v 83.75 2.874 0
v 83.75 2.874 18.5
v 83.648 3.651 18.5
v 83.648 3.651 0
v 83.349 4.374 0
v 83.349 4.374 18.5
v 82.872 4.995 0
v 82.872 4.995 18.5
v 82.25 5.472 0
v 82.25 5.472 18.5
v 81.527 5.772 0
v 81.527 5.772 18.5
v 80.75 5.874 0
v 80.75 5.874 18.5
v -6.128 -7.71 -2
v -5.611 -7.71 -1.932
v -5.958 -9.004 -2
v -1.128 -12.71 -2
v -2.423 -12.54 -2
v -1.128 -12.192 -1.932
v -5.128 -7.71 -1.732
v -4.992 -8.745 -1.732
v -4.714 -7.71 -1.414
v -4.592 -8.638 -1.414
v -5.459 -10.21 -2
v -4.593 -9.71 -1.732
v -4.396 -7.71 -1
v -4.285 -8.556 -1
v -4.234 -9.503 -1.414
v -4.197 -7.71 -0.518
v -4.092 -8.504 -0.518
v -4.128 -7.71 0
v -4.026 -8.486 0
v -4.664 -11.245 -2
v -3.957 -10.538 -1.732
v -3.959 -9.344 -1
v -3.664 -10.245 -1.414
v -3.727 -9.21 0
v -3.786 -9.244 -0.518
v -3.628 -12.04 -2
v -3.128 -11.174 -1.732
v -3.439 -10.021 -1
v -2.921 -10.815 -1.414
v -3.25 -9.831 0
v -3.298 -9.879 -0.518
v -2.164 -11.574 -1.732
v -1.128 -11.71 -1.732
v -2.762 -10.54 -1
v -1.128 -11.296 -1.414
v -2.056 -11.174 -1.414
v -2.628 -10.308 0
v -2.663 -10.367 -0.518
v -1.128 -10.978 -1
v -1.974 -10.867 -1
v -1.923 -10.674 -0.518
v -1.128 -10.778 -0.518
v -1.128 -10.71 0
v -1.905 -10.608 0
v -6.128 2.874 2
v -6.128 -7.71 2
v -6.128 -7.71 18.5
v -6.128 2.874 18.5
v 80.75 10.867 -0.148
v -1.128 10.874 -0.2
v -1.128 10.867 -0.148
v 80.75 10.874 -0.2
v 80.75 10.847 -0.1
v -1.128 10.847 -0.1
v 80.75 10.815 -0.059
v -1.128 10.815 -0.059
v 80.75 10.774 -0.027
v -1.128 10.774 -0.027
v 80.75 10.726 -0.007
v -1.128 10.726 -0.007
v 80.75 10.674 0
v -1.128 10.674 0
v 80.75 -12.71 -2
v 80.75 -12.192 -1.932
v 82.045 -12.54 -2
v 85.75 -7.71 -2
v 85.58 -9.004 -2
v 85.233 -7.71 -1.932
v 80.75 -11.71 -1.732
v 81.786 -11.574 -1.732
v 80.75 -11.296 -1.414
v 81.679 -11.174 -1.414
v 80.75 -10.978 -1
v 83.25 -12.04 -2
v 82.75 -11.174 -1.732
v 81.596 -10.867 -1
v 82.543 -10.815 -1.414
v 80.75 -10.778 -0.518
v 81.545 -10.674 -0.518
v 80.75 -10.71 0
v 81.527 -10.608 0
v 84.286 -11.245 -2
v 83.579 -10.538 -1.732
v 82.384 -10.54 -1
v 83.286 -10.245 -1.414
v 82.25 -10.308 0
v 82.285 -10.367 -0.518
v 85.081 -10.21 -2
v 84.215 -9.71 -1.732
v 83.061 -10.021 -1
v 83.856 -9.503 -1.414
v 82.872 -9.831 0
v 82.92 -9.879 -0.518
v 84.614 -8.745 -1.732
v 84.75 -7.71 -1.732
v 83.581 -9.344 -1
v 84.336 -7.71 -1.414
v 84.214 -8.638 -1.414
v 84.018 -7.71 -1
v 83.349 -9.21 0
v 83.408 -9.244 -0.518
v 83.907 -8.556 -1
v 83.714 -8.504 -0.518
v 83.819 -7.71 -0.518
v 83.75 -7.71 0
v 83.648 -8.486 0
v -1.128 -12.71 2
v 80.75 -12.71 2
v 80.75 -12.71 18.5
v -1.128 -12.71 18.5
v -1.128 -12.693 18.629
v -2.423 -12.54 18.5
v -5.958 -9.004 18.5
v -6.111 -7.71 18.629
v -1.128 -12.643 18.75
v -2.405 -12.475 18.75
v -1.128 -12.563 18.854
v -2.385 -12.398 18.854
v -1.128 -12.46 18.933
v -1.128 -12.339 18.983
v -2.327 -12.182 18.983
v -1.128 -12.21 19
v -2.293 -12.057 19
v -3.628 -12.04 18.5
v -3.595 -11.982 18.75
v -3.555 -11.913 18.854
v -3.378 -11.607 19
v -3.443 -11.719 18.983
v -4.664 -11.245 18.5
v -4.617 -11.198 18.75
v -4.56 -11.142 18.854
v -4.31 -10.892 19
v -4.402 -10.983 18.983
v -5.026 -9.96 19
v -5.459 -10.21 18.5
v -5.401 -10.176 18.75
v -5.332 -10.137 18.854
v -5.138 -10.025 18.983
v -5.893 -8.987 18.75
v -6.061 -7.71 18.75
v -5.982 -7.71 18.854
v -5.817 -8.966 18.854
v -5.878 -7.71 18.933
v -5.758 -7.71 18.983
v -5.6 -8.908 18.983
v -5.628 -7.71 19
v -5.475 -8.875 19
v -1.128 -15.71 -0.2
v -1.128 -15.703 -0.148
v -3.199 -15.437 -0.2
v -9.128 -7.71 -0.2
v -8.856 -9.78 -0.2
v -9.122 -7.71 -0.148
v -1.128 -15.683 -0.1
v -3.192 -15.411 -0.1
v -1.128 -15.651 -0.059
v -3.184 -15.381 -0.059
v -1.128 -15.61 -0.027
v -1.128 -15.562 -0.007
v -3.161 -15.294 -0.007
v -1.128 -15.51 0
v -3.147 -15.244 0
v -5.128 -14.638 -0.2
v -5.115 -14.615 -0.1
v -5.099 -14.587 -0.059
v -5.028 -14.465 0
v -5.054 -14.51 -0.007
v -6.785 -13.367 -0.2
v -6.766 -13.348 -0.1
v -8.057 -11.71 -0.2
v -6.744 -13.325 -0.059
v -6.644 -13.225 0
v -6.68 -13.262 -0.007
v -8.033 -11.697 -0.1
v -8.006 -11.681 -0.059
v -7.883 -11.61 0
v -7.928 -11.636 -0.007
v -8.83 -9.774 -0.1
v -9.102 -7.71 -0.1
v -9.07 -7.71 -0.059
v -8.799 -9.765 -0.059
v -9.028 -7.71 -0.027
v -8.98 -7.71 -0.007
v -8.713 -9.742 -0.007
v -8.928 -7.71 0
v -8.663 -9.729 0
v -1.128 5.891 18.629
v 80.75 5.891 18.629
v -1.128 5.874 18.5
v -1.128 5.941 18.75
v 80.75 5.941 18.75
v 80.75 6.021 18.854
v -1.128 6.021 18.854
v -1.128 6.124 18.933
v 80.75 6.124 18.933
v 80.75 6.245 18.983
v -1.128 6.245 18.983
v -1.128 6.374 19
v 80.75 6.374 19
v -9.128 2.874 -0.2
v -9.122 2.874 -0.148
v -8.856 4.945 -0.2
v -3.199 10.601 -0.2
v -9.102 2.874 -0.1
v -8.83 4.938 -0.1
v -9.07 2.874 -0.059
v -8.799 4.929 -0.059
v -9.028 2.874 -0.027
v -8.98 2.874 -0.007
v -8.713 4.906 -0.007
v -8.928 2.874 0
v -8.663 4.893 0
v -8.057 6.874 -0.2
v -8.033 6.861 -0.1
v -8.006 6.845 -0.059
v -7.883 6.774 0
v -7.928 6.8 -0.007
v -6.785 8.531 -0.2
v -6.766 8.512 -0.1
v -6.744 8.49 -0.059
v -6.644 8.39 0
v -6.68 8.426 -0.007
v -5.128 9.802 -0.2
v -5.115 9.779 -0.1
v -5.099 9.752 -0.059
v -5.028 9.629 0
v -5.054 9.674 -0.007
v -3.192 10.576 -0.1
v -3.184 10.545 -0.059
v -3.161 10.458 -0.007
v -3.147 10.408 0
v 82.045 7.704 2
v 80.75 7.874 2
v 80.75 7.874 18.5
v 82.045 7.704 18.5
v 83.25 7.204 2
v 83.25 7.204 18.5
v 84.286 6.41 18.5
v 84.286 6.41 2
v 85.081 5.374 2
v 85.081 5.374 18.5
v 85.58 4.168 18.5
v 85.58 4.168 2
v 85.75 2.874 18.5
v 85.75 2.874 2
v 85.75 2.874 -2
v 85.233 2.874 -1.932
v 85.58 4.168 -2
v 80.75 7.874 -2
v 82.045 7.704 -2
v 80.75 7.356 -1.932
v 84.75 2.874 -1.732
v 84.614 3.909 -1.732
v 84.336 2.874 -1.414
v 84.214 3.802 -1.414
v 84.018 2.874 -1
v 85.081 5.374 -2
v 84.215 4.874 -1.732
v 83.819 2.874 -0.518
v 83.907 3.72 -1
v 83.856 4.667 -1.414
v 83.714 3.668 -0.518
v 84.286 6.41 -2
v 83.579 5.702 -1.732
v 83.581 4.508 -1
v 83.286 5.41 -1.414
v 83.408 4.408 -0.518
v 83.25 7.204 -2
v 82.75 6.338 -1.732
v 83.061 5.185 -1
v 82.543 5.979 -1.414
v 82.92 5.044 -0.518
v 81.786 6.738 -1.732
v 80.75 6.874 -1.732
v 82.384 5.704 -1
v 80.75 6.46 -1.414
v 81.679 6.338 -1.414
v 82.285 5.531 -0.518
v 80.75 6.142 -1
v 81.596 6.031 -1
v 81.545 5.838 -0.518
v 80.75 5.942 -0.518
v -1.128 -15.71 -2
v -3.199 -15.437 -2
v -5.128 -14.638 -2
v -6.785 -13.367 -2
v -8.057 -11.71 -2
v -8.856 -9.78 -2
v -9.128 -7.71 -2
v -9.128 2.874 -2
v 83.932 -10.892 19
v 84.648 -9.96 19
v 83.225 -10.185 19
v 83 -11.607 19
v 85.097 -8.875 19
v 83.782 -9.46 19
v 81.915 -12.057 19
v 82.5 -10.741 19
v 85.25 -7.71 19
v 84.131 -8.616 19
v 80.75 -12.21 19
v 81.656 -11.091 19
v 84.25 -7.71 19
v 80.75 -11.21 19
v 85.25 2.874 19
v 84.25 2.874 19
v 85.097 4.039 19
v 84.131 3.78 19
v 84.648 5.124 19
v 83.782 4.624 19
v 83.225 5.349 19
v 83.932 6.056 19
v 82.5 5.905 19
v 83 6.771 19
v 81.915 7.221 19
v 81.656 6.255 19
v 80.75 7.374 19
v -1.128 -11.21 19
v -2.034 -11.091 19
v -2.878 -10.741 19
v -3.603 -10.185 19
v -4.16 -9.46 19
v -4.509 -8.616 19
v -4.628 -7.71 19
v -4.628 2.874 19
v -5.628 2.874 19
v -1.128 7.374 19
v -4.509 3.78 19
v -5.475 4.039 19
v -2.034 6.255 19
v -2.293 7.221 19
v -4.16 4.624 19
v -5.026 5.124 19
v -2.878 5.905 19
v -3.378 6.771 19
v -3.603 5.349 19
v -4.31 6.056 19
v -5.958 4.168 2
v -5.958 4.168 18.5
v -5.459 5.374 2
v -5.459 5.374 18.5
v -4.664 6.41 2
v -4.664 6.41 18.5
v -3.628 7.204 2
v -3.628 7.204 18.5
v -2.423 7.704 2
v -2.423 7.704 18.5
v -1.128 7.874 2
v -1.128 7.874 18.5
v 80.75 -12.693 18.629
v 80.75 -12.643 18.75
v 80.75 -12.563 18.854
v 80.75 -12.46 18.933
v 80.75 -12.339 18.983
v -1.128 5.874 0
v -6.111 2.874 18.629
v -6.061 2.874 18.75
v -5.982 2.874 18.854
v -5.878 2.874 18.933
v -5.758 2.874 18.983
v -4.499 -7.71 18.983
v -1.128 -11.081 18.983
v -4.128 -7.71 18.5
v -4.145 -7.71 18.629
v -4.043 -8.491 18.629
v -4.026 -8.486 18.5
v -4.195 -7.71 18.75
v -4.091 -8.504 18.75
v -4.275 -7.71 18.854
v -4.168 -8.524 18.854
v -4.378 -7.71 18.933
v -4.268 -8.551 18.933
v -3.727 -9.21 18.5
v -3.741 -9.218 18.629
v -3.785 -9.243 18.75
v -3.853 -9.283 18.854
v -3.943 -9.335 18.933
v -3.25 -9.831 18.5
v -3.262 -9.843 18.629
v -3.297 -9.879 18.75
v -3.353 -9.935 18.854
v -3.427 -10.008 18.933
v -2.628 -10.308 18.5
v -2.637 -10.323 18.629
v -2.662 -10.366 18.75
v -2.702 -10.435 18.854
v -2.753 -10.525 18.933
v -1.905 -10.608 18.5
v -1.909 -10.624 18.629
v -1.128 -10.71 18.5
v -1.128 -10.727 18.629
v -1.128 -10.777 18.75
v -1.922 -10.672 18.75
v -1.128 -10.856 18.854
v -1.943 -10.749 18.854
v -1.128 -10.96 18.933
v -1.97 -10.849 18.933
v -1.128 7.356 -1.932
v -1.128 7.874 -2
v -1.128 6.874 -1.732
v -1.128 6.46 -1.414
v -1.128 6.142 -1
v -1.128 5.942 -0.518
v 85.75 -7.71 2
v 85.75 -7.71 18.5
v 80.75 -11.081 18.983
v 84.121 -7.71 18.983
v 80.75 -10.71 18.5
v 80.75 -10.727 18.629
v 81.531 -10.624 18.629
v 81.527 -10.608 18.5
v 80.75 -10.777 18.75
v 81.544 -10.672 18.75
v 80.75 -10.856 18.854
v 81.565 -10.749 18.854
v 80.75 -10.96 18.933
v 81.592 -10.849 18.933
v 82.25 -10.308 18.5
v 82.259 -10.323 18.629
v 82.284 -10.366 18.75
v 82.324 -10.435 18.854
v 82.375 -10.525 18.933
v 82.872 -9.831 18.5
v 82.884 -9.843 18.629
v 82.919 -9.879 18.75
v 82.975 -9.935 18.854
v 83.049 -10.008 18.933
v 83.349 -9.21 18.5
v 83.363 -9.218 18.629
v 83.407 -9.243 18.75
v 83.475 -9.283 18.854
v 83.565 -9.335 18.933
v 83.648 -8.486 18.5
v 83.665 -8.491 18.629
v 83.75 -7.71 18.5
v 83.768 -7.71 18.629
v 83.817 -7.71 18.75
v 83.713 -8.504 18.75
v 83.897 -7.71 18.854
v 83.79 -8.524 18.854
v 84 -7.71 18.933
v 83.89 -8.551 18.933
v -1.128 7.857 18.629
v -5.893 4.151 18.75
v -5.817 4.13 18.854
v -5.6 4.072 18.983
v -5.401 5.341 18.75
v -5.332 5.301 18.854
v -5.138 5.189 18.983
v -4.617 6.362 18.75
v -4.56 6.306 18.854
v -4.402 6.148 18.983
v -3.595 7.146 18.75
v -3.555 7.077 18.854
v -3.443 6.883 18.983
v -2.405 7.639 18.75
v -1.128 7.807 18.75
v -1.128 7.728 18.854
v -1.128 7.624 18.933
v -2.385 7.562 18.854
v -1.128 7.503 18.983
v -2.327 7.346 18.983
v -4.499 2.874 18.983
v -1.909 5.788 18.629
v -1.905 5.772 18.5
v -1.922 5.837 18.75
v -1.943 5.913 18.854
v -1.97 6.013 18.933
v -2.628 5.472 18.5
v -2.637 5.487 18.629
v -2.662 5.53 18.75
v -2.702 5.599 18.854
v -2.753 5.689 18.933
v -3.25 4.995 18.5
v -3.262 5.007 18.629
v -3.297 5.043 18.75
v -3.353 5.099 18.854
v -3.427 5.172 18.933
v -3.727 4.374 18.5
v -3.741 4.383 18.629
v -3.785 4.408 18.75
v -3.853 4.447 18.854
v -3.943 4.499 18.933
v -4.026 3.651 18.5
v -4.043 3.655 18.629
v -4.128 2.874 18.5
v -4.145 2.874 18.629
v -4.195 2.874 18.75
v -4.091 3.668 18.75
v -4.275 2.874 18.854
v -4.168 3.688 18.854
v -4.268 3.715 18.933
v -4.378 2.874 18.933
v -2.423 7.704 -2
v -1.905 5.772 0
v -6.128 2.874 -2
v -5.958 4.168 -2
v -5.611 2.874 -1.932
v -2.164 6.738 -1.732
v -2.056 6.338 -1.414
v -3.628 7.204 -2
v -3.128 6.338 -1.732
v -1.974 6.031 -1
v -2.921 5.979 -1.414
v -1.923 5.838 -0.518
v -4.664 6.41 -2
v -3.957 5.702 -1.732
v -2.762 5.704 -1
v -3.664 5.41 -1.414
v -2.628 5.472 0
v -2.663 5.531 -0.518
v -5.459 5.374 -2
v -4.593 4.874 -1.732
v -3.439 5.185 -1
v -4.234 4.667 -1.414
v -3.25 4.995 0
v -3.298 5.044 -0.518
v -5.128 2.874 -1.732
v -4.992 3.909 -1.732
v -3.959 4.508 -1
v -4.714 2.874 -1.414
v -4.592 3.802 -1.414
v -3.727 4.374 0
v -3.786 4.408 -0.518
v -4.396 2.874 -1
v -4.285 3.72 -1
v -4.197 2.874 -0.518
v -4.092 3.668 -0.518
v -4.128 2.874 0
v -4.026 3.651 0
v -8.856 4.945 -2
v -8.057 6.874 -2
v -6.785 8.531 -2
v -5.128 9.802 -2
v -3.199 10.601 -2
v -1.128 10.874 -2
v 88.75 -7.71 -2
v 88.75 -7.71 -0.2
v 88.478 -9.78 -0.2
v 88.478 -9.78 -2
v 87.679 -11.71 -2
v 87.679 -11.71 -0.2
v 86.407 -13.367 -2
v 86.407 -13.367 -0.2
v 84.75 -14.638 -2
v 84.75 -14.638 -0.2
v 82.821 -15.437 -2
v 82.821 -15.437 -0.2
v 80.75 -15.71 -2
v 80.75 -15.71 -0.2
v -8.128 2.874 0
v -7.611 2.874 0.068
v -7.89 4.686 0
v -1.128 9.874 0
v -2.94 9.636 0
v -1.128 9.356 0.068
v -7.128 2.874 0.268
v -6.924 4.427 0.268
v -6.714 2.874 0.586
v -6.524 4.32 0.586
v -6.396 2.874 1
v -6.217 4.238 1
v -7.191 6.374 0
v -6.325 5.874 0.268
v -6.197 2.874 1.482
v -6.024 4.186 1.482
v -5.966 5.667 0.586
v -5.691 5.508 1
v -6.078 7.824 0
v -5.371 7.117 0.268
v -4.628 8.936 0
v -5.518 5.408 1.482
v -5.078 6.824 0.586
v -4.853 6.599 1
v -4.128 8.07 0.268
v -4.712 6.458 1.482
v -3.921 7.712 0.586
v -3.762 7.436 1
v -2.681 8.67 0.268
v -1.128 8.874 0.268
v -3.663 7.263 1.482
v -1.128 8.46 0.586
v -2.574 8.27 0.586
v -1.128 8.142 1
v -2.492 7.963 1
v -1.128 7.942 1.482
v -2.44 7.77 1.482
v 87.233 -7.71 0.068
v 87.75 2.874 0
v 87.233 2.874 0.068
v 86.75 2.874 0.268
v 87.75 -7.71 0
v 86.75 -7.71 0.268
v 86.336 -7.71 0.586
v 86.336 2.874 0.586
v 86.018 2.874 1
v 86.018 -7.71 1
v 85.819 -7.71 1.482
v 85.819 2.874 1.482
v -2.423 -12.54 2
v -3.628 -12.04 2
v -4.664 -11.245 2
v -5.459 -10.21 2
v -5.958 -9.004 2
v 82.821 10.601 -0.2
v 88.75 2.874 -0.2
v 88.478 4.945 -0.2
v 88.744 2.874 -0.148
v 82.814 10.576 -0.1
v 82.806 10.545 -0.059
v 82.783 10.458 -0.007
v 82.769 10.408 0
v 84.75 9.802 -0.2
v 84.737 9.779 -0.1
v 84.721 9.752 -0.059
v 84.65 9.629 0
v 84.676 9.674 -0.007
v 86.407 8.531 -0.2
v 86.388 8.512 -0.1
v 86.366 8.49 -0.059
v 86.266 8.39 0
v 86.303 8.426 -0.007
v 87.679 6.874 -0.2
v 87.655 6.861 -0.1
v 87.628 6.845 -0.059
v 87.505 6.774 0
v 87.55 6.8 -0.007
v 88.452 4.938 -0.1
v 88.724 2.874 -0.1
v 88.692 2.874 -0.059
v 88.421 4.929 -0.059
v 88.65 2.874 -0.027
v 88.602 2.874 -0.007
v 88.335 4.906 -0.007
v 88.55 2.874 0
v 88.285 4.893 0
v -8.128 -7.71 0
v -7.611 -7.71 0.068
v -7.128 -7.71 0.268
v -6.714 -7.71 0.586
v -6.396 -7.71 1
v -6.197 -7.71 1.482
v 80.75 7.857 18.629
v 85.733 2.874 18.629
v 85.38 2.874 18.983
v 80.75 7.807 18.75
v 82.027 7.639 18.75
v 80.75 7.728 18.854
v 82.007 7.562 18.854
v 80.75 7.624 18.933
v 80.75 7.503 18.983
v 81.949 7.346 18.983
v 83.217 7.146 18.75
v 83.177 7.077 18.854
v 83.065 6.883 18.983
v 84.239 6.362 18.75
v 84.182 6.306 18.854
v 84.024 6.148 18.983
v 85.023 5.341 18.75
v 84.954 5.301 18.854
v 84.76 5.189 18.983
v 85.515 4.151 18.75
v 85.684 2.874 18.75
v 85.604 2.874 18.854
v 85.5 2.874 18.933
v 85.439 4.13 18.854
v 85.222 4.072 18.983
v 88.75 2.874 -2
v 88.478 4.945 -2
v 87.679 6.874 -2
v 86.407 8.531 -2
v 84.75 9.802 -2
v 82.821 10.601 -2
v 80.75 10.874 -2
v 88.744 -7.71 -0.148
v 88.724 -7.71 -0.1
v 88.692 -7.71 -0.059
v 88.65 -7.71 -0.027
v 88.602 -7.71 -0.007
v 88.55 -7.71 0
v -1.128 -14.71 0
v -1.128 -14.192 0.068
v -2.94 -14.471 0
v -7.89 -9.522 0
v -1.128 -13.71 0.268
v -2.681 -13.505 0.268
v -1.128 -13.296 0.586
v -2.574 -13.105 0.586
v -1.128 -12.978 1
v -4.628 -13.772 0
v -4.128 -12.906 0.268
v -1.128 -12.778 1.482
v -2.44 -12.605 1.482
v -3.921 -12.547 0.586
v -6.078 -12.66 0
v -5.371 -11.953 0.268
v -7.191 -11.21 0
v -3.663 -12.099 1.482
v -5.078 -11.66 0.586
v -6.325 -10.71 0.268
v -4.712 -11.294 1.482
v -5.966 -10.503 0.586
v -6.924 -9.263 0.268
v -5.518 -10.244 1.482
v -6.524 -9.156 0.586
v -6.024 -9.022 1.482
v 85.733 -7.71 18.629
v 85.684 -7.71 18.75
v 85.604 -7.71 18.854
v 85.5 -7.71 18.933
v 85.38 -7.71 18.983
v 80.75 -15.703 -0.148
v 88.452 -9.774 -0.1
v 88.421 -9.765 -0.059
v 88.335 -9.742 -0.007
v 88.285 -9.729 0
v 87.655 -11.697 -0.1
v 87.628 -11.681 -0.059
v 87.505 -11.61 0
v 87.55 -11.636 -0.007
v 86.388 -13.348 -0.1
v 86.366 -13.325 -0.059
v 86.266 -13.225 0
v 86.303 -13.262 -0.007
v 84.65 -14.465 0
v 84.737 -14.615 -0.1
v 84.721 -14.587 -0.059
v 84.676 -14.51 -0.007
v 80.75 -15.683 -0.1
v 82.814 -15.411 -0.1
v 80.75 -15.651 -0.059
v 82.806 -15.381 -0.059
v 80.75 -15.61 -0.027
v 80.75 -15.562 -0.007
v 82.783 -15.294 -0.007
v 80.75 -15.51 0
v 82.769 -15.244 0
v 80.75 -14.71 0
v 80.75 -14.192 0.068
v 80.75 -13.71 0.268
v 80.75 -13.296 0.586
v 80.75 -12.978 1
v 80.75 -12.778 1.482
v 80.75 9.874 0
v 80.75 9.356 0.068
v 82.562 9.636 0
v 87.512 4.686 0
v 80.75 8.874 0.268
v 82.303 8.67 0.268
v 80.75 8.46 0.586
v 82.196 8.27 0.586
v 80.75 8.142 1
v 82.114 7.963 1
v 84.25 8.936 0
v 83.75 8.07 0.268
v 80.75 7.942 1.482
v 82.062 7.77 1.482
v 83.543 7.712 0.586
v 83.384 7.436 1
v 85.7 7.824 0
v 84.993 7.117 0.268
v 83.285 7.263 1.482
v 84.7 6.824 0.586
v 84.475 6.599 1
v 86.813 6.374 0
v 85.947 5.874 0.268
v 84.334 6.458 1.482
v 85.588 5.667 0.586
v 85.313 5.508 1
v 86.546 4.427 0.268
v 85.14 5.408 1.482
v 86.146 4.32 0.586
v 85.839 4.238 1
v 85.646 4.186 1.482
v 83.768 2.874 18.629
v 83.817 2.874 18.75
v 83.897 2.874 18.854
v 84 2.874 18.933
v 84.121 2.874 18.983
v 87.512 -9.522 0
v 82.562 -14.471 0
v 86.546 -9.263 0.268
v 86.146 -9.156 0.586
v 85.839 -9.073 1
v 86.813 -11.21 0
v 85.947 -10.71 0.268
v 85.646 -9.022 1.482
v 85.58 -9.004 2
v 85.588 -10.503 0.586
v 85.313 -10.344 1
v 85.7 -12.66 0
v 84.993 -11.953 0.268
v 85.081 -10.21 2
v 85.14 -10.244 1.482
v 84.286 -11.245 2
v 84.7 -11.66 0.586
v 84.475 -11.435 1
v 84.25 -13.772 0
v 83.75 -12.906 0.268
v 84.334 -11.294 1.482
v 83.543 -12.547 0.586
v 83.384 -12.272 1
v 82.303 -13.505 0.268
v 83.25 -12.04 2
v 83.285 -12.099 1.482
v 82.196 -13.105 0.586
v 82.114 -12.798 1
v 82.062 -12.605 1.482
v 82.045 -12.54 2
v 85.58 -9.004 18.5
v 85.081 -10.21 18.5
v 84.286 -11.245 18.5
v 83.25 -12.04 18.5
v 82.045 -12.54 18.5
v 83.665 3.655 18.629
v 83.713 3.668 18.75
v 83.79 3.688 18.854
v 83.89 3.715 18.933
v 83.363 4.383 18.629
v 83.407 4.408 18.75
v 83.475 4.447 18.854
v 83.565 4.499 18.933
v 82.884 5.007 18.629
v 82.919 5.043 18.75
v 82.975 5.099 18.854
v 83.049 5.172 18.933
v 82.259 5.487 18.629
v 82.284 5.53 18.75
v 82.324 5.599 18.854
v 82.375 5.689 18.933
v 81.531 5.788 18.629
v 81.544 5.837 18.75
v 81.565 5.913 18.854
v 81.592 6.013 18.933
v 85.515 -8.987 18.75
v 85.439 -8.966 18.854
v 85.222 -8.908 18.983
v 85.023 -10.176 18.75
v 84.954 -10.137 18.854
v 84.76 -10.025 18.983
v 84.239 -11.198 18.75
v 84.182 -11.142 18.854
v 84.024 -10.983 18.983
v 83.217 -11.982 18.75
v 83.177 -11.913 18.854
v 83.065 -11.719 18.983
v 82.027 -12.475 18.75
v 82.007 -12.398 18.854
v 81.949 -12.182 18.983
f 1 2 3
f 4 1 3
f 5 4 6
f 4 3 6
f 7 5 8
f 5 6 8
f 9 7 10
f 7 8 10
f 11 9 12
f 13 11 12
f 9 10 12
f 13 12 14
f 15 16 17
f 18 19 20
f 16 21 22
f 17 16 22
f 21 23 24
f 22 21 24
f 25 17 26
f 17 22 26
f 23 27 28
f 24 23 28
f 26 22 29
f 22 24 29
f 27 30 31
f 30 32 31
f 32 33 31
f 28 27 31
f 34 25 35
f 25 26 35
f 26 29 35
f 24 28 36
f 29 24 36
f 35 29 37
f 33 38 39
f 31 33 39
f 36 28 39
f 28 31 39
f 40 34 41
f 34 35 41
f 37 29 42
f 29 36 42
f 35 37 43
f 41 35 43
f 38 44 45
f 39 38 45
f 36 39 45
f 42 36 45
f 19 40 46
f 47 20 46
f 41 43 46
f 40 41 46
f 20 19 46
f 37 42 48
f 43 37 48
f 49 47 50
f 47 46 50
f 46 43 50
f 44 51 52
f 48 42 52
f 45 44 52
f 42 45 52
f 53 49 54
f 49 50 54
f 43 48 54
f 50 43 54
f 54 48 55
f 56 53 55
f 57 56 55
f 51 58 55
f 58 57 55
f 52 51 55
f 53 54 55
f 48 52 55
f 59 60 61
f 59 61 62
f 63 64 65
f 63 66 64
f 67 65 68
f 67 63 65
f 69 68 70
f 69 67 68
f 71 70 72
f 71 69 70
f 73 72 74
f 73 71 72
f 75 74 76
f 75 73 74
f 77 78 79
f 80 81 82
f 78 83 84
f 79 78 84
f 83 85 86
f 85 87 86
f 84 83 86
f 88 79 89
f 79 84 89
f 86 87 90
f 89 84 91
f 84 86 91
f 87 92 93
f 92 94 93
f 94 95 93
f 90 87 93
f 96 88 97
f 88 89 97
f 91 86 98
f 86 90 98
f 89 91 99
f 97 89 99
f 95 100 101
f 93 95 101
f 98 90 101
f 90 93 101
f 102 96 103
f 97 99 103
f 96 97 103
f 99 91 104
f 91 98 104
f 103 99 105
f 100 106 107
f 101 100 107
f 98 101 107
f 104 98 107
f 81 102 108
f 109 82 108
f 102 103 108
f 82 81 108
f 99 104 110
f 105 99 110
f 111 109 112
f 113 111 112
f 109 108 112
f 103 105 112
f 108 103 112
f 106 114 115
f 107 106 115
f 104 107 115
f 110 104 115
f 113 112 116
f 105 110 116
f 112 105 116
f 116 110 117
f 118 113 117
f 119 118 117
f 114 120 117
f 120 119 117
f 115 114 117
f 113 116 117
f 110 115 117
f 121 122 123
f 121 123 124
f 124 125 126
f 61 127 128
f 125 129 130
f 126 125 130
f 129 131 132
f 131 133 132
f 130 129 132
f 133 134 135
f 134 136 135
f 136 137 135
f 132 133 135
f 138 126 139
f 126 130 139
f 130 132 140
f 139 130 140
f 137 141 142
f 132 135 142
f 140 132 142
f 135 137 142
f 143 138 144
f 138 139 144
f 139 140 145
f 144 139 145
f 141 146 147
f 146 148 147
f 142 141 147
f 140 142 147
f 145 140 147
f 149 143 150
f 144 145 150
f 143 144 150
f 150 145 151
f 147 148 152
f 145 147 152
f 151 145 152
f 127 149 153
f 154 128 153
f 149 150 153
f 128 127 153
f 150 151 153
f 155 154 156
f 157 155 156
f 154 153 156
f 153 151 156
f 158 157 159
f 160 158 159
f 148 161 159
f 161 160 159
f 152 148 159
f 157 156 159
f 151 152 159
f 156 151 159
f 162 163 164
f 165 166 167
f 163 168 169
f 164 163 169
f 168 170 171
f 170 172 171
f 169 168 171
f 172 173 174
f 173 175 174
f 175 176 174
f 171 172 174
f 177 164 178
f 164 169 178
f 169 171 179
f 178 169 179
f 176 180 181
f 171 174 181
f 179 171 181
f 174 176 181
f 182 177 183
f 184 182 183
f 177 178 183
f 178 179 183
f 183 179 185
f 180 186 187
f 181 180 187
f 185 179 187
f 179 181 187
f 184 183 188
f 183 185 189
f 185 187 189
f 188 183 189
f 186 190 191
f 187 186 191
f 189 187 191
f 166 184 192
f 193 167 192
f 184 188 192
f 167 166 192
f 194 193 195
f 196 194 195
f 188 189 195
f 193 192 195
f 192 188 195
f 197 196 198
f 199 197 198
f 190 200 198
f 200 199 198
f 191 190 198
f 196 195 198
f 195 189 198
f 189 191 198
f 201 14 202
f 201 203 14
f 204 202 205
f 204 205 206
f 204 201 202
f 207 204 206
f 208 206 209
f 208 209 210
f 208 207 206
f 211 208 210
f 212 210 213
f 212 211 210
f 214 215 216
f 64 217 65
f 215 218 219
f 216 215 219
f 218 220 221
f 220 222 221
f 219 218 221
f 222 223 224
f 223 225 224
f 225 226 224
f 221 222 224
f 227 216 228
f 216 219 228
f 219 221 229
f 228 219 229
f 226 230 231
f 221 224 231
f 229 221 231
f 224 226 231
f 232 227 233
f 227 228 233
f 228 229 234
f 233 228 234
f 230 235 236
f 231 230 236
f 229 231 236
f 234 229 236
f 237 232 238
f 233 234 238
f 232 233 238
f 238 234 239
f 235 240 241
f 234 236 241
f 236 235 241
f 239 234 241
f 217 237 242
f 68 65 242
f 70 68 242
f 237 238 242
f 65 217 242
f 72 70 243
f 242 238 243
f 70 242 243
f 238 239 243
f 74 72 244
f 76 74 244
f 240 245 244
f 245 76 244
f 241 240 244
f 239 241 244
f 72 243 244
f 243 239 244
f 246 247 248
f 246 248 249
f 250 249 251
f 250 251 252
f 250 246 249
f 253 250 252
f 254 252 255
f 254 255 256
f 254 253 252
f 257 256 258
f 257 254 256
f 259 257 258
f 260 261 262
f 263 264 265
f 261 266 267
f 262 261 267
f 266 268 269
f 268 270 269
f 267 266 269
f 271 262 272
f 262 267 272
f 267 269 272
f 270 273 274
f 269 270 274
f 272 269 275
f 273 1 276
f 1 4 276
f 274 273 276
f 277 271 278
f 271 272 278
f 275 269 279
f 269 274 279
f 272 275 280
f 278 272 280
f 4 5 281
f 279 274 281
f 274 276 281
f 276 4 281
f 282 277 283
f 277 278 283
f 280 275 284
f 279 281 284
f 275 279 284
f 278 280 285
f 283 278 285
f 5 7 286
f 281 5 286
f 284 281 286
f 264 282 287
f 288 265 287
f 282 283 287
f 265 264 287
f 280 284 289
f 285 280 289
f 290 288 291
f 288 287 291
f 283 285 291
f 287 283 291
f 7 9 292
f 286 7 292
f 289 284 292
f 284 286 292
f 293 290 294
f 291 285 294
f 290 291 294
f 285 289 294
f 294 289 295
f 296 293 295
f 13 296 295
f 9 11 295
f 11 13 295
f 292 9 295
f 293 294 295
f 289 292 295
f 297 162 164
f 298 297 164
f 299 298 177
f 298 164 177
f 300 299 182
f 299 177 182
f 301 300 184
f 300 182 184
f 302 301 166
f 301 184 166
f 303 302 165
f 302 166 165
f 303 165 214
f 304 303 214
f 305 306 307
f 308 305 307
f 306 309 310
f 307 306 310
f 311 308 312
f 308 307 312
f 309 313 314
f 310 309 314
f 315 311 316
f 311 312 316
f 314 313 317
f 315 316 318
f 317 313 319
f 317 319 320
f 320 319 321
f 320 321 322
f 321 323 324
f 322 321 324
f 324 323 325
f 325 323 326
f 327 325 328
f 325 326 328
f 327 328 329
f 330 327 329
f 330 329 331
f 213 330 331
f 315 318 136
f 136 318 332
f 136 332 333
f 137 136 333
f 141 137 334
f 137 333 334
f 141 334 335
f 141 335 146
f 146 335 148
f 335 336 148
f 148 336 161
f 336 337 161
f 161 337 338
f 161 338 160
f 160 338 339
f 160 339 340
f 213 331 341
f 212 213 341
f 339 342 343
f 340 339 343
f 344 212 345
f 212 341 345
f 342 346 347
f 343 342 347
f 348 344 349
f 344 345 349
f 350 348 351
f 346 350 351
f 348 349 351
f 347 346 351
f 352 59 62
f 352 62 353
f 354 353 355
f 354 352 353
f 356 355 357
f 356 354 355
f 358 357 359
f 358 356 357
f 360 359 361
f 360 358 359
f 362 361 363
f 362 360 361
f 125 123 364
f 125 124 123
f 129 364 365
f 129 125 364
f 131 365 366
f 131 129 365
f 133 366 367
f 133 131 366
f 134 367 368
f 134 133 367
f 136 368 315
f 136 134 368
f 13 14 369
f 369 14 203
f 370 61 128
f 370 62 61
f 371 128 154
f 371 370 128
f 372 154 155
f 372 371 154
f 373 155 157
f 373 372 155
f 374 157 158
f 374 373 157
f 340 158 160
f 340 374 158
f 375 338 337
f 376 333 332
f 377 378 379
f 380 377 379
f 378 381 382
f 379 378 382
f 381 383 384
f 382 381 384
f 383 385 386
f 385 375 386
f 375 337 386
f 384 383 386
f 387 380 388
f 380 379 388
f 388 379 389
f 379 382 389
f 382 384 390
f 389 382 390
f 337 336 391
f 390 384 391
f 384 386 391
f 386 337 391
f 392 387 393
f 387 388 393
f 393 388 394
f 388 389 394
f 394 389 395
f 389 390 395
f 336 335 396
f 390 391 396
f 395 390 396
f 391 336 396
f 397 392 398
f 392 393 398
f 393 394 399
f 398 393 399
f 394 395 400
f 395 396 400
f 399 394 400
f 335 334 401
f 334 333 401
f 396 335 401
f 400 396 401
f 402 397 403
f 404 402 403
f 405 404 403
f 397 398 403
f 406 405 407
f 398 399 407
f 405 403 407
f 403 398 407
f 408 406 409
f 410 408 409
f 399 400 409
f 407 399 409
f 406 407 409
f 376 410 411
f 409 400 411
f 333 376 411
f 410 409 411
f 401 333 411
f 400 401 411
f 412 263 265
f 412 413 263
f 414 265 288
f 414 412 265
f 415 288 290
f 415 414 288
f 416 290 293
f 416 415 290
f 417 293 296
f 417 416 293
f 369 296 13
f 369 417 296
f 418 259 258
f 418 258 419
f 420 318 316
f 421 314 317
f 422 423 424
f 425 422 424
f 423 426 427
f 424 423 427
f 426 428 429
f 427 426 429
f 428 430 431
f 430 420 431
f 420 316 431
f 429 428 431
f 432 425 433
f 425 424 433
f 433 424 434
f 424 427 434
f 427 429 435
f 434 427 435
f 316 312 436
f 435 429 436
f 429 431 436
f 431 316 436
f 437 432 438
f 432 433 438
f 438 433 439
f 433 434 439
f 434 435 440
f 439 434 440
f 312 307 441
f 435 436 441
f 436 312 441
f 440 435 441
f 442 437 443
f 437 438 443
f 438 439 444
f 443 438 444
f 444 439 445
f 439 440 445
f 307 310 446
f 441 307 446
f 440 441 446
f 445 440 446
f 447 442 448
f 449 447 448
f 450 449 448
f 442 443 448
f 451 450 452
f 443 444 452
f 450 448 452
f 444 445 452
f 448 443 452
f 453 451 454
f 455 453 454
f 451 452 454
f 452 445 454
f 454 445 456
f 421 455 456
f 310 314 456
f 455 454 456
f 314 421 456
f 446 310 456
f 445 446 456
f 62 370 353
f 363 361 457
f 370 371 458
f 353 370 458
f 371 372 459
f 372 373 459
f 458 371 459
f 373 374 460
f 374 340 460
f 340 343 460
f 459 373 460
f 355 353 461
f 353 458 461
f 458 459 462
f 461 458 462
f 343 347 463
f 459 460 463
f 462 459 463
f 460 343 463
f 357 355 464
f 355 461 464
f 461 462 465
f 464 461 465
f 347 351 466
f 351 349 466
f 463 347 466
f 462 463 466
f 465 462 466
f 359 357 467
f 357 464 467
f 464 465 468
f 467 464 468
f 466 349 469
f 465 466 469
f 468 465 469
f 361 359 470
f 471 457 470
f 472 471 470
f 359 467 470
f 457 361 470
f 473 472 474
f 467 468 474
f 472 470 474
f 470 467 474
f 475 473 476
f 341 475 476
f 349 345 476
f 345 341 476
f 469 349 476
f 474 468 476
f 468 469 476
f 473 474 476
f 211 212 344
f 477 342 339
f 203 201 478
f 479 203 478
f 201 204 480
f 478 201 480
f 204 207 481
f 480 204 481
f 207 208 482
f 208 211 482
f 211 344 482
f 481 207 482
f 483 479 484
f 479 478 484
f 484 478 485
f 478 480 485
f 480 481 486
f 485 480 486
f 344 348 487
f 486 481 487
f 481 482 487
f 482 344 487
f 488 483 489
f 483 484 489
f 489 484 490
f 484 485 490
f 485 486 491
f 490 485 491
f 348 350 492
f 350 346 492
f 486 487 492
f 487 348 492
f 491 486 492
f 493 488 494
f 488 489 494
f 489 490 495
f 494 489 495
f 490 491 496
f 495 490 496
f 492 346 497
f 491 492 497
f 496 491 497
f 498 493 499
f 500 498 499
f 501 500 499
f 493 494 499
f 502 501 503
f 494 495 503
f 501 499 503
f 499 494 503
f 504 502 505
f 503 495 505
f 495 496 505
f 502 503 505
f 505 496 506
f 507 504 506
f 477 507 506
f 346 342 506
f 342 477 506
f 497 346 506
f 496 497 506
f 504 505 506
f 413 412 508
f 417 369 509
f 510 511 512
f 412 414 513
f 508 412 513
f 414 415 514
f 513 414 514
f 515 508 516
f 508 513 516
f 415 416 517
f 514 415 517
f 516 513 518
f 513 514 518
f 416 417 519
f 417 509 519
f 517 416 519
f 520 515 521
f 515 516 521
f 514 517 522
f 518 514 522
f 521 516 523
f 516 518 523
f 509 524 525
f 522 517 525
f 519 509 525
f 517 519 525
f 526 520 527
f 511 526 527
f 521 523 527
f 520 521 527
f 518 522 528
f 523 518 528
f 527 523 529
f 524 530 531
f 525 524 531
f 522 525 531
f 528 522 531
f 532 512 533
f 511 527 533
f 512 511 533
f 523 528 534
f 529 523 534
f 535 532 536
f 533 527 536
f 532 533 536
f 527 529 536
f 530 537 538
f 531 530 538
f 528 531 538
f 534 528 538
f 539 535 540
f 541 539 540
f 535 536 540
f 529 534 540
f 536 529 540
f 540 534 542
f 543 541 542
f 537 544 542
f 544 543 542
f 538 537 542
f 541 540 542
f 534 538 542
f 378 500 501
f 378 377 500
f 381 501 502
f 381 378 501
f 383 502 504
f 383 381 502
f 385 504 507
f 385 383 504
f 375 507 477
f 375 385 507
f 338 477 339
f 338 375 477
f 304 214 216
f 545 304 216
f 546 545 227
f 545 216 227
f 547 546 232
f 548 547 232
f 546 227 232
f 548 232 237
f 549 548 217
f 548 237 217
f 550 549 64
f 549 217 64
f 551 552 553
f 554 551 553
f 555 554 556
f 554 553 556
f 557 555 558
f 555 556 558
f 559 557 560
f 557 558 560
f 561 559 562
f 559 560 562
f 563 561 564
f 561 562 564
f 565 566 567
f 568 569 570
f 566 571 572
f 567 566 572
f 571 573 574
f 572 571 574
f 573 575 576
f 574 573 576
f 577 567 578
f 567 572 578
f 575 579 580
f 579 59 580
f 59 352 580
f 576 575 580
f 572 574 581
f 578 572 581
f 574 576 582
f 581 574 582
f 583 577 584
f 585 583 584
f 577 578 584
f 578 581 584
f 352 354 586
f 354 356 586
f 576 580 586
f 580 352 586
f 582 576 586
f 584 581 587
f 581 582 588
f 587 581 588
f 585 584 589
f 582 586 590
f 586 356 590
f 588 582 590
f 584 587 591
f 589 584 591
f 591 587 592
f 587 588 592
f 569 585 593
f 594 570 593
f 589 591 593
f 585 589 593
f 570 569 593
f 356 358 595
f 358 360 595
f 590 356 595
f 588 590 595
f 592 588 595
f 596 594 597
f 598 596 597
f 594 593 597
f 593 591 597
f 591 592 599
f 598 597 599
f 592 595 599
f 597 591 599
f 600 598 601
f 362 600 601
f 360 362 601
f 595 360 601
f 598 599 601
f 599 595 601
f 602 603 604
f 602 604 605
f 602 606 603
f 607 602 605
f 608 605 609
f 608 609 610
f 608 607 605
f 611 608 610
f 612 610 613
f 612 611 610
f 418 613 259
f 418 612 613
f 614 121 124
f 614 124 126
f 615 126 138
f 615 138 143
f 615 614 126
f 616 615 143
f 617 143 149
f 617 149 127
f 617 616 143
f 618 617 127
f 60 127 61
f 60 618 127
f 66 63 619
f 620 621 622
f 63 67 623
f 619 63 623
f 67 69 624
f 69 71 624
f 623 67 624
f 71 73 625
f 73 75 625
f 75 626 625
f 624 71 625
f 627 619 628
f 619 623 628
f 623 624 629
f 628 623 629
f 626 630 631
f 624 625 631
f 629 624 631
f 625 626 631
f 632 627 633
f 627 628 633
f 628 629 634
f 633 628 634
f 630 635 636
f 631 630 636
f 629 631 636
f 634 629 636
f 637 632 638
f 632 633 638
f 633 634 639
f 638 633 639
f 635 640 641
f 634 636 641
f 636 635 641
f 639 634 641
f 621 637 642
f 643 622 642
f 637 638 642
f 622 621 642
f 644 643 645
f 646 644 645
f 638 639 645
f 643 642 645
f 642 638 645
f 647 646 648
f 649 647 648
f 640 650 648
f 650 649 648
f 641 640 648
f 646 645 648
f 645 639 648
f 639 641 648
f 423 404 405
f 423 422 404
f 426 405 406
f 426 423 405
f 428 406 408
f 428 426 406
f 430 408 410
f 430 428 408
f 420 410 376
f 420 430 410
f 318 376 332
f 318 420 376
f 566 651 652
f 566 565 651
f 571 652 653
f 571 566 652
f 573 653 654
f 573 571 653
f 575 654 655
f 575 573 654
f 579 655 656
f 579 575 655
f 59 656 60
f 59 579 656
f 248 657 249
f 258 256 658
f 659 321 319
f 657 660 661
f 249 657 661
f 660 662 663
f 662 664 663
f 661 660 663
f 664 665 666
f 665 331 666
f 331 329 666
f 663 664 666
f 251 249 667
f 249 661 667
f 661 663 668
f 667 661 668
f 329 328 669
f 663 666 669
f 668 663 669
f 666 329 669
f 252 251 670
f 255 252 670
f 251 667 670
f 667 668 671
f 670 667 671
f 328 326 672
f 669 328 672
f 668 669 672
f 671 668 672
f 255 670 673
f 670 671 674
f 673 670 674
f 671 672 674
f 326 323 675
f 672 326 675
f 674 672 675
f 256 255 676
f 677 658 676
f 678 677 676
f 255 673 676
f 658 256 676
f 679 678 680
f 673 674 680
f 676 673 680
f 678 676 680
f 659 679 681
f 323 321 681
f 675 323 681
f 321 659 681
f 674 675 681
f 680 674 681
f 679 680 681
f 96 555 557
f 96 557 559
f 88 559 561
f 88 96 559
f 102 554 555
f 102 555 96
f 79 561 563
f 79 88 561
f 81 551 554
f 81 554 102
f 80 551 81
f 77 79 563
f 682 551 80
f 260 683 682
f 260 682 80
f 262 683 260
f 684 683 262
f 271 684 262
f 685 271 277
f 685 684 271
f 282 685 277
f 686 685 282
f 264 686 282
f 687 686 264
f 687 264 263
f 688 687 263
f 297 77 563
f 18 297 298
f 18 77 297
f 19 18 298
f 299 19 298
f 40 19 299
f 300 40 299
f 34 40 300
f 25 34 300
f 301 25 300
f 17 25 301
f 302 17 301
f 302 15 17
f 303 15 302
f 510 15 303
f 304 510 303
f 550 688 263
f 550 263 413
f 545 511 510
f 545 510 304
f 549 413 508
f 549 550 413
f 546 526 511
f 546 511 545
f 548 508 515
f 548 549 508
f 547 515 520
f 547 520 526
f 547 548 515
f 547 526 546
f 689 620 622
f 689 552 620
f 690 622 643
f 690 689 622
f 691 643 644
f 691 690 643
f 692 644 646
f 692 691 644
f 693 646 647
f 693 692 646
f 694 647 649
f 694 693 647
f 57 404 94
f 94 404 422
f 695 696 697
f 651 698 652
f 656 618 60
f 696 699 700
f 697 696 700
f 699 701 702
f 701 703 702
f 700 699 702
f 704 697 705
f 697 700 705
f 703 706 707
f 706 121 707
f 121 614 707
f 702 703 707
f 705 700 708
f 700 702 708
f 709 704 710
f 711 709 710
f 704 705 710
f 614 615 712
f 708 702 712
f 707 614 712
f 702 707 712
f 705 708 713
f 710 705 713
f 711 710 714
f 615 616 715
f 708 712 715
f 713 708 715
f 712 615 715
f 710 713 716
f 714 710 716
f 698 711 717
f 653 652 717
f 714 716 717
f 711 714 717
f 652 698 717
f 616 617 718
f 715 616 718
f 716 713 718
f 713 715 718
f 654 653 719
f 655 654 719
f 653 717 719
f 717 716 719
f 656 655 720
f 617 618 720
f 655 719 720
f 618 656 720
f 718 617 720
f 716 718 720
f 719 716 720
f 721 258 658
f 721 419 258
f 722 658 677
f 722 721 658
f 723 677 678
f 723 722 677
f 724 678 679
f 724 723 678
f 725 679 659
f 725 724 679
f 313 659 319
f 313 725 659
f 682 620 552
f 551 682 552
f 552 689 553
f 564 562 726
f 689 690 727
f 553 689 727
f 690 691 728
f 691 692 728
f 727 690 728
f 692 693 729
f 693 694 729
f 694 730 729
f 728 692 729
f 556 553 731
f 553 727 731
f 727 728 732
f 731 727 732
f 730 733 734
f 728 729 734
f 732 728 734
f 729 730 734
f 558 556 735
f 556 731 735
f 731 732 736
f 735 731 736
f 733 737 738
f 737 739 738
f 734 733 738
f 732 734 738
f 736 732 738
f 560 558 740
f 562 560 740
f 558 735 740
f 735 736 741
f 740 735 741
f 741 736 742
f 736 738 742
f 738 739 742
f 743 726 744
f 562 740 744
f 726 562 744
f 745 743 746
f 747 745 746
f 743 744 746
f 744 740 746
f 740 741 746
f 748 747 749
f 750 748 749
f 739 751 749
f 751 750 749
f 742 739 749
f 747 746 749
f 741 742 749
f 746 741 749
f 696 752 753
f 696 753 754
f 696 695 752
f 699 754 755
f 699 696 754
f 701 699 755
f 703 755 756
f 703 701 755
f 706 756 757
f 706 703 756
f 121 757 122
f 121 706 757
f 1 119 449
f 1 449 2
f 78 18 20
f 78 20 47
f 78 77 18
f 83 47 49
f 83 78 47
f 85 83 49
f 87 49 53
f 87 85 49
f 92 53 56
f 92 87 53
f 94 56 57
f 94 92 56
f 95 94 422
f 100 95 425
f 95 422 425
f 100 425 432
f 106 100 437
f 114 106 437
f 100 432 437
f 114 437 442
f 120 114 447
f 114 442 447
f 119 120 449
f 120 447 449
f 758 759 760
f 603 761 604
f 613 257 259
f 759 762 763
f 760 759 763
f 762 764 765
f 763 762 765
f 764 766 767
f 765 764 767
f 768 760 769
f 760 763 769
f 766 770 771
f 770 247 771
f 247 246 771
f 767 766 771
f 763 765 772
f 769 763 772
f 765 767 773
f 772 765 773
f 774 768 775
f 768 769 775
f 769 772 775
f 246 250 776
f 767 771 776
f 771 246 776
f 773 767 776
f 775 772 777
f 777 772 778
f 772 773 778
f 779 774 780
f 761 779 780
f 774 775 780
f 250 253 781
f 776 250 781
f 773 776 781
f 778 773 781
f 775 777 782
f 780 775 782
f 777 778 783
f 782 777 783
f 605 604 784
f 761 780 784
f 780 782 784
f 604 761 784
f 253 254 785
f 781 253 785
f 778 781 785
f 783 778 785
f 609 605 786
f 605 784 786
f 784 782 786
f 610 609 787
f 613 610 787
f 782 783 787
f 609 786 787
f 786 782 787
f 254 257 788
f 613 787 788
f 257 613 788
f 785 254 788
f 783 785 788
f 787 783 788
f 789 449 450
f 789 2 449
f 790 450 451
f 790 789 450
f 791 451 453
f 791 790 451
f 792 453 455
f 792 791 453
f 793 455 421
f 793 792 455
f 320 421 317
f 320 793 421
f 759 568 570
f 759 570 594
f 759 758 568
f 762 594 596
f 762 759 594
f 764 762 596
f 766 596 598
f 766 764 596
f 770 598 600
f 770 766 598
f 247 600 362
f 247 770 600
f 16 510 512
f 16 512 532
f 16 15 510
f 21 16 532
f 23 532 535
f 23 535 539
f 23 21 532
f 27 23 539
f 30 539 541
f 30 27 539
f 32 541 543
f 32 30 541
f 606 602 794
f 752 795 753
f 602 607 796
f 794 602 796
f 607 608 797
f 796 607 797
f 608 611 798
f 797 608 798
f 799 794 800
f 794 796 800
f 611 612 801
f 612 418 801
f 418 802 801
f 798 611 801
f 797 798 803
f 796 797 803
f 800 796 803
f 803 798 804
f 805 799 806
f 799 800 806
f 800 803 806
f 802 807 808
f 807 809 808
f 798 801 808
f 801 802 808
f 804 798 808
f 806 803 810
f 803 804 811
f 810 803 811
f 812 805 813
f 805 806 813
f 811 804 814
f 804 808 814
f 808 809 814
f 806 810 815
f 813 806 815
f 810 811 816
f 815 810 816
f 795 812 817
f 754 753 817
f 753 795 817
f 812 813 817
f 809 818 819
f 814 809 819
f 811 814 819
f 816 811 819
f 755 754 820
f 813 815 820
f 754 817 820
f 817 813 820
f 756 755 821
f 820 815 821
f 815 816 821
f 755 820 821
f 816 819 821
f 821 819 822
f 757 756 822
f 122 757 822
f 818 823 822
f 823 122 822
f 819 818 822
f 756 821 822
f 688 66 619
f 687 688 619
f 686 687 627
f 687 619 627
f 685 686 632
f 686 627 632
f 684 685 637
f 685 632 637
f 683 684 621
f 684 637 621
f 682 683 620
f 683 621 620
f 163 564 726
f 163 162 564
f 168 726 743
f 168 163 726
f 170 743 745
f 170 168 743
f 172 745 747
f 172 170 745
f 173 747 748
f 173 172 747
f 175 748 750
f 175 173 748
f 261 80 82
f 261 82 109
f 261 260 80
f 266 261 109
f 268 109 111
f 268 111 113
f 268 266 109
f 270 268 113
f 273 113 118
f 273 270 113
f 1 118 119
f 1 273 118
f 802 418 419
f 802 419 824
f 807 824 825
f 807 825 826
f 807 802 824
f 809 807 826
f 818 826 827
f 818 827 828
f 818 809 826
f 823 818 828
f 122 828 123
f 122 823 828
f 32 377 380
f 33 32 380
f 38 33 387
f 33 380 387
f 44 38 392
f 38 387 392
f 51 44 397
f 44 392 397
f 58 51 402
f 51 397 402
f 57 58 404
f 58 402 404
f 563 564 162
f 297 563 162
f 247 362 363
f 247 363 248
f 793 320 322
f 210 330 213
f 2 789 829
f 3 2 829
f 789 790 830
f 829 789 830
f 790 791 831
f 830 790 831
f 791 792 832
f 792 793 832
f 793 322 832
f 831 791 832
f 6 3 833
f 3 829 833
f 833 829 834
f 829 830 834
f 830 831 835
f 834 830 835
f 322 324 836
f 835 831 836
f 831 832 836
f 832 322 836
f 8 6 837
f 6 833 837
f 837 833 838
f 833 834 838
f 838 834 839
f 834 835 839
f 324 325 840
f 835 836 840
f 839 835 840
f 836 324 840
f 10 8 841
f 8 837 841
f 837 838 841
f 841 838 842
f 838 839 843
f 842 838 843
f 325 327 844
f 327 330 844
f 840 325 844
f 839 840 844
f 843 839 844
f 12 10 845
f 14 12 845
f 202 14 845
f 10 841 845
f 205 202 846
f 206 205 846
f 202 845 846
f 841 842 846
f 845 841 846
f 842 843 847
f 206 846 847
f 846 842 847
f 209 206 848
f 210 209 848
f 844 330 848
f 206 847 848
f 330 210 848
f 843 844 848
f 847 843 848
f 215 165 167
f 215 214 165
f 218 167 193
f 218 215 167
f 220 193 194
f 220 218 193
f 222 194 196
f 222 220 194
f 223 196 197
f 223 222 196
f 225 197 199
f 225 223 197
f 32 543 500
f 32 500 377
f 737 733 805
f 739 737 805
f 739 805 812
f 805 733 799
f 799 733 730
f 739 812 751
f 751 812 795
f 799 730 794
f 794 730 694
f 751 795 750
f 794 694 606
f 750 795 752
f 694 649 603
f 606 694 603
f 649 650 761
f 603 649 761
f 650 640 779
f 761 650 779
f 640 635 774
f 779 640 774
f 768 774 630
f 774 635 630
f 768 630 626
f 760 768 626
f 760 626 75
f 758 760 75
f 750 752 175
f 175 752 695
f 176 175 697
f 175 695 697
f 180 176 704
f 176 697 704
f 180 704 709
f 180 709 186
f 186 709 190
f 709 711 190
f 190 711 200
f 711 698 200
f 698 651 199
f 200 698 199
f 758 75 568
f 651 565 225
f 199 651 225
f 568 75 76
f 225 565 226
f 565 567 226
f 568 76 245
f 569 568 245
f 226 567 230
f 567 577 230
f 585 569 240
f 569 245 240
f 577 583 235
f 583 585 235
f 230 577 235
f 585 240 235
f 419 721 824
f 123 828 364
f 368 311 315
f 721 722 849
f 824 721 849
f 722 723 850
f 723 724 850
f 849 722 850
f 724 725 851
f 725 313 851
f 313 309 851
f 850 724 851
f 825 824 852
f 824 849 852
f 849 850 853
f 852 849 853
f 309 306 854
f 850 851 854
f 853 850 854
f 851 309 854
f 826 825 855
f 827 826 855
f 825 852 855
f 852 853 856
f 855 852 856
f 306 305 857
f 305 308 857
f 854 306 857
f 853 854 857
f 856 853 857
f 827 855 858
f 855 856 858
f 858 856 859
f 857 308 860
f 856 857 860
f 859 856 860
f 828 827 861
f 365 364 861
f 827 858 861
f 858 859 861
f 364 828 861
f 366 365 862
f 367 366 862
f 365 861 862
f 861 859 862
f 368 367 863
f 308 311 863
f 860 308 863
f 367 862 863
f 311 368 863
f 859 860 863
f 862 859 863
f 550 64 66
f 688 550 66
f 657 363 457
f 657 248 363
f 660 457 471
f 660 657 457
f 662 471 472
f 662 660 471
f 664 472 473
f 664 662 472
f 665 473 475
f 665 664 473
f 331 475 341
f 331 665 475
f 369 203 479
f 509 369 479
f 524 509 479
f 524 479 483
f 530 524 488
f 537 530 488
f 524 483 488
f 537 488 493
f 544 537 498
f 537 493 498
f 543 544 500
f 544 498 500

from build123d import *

# Parameters (mm, degrees)
BOSS_EXTRUDE1_DEPTH = 2
BOSS_EXTRUDE2_DEPTH = 19
CUT_EXTRUDE1_DEPTH  = 32
FILLET1_R           = 0.5
FILLET2_R           = 2
FILLET3_R           = 2
FILLET4_R           = 0.2


with BuildPart() as part:
    # Sketch1 → Boss-Extrude1 (new body)
    with BuildSketch(Plane.XY):
        with BuildLine():
            Line((80.75048871, 10.874070422), (-1.128427562, 10.874070422))
            ThreePointArc((-1.128427562, 10.874070422), (-6.785281811, 8.530924671), (-9.128427562, 2.874070422))
            Line((-9.128427562, 2.874070422), (-9.128427562, -7.709925539))
            ThreePointArc((-9.128427562, -7.709925539), (-6.785281811, -13.366779789), (-1.128427562, -15.709925539))
            Line((-1.128427562, -15.709925539), (80.75048871, -15.709925539))
            ThreePointArc((80.75048871, -15.709925539), (86.40734296, -13.366779789), (88.75048871, -7.709925539))
            Line((88.75048871, -7.709925539), (88.75048871, 2.874070422))
            ThreePointArc((88.75048871, 2.874070422), (86.40734296, 8.530924671), (80.75048871, 10.874070422))
        make_face()
    extrude(amount=-BOSS_EXTRUDE1_DEPTH)

    # Sketch1<6> → Boss-Extrude2 (add)
    with BuildSketch(Plane.XY):
        with BuildLine():
            Line((80.75048871, 7.874070422), (-1.128427562, 7.874070422))
            ThreePointArc((-1.128427562, 7.874070422), (-4.663961468, 6.409604328), (-6.128427562, 2.874070422))
            Line((-6.128427562, 2.874070422), (-6.128427562, -7.709925539))
            ThreePointArc((-6.128427562, -7.709925539), (-4.663961468, -11.245459445), (-1.128427562, -12.709925539))
            Line((-1.128427562, -12.709925539), (80.75048871, -12.709925539))
            ThreePointArc((80.75048871, -12.709925539), (84.286022616, -11.245459445), (85.75048871, -7.709925539))
            Line((85.75048871, -7.709925539), (85.75048871, 2.874070422))
            ThreePointArc((85.75048871, 2.874070422), (84.286022616, 6.409604328), (80.75048871, 7.874070422))
        make_face()
    extrude(amount=BOSS_EXTRUDE2_DEPTH)

    # Sketch2 → Cut-Extrude1 (cut)
    with BuildSketch(Plane.XY.offset(19)):
        with BuildLine():
            Line((-4.128427562, 2.874070422), (-4.128427562, -7.709925539))
            ThreePointArc((-4.128427562, -7.709925539), (-3.249747905, -9.831245883), (-1.128427562, -10.709925539))
            Line((-1.128427562, -10.709925539), (80.75048871, -10.709925539))
            ThreePointArc((80.75048871, -10.709925539), (82.871809054, -9.831245883), (83.75048871, -7.709925539))
            Line((83.75048871, -7.709925539), (83.75048871, 2.874070422))
            ThreePointArc((83.75048871, 2.874070422), (82.871809054, 4.995390765), (80.75048871, 5.874070422))
            Line((80.75048871, 5.874070422), (-1.128427562, 5.874070422))
            ThreePointArc((-1.128427562, 5.874070422), (-3.249747905, 4.995390765), (-4.128427562, 2.874070422))
        make_face()
    extrude(amount=-CUT_EXTRUDE1_DEPTH, mode=Mode.SUBTRACT)

    # Fillet1
    fillet1_edges = [part.edges().sort_by_distance(p)[0] for p in [
        (39.811030574, 7.874070422, 19),
        (84.286022616, 6.409604328, 19),
        (85.75048871, -2.417927559, 19),
        (84.286022616, -11.245459445, 19),
        (39.811030574, -12.709925539, 19),
        (-4.663961468, -11.245459445, 19),
        (-6.128427562, -2.417927559, 19),
        (-4.663961468, 6.409604328, 19),
        (-4.128427562, -2.417927559, 19),
        (-3.249747905, -9.831245883, 19),
        (39.811030574, -10.709925539, 19),
        (82.871809054, -9.831245883, 19),
        (83.75048871, -2.417927559, 19),
        (82.871809054, 4.995390765, 19),
        (39.811030574, 5.874070422, 19),
        (-3.249747905, 4.995390765, 19),
    ]]
    fillet(fillet1_edges, radius=FILLET1_R)

    # Fillet2
    fillet2_edges = [part.edges().sort_by_distance(p)[0] for p in [
        (-4.663961468, 6.409604328, 0),
        (-6.128427562, -2.417927559, 0),
        (-4.663961468, -11.245459445, 0),
        (39.811030574, -12.709925539, 0),
        (84.286022616, -11.245459445, 0),
        (85.75048871, -2.417927559, 0),
        (84.286022616, 6.409604328, 0),
        (39.811030574, 7.874070422, 0),
    ]]
    fillet(fillet2_edges, radius=FILLET2_R)

    # Fillet3
    fillet3_edges = [part.edges().sort_by_distance(p)[0] for p in [
        (-3.249747905, -9.831245883, -2),
        (-4.128427562, -2.417927559, -2),
        (-3.249747905, 4.995390765, -2),
        (39.811030574, 5.874070422, -2),
        (82.871809054, 4.995390765, -2),
        (83.75048871, -2.417927559, -2),
        (82.871809054, -9.831245883, -2),
        (39.811030574, -10.709925539, -2),
    ]]
    fillet(fillet3_edges, radius=FILLET3_R)

    # Fillet4
    fillet4_edges = [part.edges().sort_by_distance(p)[0] for p in [
        (-6.785281811, 8.530924671, 0),
        (-9.128427562, -2.417927559, 0),
        (-6.785281811, -13.366779789, 0),
        (39.811030574, -15.709925539, 0),
        (86.40734296, -13.366779789, 0),
        (88.75048871, -2.417927559, 0),
        (86.40734296, 8.530924671, 0),
        (39.811030574, 10.874070422, 0),
    ]]
    fillet(fillet4_edges, radius=FILLET4_R)


solid = part.part
